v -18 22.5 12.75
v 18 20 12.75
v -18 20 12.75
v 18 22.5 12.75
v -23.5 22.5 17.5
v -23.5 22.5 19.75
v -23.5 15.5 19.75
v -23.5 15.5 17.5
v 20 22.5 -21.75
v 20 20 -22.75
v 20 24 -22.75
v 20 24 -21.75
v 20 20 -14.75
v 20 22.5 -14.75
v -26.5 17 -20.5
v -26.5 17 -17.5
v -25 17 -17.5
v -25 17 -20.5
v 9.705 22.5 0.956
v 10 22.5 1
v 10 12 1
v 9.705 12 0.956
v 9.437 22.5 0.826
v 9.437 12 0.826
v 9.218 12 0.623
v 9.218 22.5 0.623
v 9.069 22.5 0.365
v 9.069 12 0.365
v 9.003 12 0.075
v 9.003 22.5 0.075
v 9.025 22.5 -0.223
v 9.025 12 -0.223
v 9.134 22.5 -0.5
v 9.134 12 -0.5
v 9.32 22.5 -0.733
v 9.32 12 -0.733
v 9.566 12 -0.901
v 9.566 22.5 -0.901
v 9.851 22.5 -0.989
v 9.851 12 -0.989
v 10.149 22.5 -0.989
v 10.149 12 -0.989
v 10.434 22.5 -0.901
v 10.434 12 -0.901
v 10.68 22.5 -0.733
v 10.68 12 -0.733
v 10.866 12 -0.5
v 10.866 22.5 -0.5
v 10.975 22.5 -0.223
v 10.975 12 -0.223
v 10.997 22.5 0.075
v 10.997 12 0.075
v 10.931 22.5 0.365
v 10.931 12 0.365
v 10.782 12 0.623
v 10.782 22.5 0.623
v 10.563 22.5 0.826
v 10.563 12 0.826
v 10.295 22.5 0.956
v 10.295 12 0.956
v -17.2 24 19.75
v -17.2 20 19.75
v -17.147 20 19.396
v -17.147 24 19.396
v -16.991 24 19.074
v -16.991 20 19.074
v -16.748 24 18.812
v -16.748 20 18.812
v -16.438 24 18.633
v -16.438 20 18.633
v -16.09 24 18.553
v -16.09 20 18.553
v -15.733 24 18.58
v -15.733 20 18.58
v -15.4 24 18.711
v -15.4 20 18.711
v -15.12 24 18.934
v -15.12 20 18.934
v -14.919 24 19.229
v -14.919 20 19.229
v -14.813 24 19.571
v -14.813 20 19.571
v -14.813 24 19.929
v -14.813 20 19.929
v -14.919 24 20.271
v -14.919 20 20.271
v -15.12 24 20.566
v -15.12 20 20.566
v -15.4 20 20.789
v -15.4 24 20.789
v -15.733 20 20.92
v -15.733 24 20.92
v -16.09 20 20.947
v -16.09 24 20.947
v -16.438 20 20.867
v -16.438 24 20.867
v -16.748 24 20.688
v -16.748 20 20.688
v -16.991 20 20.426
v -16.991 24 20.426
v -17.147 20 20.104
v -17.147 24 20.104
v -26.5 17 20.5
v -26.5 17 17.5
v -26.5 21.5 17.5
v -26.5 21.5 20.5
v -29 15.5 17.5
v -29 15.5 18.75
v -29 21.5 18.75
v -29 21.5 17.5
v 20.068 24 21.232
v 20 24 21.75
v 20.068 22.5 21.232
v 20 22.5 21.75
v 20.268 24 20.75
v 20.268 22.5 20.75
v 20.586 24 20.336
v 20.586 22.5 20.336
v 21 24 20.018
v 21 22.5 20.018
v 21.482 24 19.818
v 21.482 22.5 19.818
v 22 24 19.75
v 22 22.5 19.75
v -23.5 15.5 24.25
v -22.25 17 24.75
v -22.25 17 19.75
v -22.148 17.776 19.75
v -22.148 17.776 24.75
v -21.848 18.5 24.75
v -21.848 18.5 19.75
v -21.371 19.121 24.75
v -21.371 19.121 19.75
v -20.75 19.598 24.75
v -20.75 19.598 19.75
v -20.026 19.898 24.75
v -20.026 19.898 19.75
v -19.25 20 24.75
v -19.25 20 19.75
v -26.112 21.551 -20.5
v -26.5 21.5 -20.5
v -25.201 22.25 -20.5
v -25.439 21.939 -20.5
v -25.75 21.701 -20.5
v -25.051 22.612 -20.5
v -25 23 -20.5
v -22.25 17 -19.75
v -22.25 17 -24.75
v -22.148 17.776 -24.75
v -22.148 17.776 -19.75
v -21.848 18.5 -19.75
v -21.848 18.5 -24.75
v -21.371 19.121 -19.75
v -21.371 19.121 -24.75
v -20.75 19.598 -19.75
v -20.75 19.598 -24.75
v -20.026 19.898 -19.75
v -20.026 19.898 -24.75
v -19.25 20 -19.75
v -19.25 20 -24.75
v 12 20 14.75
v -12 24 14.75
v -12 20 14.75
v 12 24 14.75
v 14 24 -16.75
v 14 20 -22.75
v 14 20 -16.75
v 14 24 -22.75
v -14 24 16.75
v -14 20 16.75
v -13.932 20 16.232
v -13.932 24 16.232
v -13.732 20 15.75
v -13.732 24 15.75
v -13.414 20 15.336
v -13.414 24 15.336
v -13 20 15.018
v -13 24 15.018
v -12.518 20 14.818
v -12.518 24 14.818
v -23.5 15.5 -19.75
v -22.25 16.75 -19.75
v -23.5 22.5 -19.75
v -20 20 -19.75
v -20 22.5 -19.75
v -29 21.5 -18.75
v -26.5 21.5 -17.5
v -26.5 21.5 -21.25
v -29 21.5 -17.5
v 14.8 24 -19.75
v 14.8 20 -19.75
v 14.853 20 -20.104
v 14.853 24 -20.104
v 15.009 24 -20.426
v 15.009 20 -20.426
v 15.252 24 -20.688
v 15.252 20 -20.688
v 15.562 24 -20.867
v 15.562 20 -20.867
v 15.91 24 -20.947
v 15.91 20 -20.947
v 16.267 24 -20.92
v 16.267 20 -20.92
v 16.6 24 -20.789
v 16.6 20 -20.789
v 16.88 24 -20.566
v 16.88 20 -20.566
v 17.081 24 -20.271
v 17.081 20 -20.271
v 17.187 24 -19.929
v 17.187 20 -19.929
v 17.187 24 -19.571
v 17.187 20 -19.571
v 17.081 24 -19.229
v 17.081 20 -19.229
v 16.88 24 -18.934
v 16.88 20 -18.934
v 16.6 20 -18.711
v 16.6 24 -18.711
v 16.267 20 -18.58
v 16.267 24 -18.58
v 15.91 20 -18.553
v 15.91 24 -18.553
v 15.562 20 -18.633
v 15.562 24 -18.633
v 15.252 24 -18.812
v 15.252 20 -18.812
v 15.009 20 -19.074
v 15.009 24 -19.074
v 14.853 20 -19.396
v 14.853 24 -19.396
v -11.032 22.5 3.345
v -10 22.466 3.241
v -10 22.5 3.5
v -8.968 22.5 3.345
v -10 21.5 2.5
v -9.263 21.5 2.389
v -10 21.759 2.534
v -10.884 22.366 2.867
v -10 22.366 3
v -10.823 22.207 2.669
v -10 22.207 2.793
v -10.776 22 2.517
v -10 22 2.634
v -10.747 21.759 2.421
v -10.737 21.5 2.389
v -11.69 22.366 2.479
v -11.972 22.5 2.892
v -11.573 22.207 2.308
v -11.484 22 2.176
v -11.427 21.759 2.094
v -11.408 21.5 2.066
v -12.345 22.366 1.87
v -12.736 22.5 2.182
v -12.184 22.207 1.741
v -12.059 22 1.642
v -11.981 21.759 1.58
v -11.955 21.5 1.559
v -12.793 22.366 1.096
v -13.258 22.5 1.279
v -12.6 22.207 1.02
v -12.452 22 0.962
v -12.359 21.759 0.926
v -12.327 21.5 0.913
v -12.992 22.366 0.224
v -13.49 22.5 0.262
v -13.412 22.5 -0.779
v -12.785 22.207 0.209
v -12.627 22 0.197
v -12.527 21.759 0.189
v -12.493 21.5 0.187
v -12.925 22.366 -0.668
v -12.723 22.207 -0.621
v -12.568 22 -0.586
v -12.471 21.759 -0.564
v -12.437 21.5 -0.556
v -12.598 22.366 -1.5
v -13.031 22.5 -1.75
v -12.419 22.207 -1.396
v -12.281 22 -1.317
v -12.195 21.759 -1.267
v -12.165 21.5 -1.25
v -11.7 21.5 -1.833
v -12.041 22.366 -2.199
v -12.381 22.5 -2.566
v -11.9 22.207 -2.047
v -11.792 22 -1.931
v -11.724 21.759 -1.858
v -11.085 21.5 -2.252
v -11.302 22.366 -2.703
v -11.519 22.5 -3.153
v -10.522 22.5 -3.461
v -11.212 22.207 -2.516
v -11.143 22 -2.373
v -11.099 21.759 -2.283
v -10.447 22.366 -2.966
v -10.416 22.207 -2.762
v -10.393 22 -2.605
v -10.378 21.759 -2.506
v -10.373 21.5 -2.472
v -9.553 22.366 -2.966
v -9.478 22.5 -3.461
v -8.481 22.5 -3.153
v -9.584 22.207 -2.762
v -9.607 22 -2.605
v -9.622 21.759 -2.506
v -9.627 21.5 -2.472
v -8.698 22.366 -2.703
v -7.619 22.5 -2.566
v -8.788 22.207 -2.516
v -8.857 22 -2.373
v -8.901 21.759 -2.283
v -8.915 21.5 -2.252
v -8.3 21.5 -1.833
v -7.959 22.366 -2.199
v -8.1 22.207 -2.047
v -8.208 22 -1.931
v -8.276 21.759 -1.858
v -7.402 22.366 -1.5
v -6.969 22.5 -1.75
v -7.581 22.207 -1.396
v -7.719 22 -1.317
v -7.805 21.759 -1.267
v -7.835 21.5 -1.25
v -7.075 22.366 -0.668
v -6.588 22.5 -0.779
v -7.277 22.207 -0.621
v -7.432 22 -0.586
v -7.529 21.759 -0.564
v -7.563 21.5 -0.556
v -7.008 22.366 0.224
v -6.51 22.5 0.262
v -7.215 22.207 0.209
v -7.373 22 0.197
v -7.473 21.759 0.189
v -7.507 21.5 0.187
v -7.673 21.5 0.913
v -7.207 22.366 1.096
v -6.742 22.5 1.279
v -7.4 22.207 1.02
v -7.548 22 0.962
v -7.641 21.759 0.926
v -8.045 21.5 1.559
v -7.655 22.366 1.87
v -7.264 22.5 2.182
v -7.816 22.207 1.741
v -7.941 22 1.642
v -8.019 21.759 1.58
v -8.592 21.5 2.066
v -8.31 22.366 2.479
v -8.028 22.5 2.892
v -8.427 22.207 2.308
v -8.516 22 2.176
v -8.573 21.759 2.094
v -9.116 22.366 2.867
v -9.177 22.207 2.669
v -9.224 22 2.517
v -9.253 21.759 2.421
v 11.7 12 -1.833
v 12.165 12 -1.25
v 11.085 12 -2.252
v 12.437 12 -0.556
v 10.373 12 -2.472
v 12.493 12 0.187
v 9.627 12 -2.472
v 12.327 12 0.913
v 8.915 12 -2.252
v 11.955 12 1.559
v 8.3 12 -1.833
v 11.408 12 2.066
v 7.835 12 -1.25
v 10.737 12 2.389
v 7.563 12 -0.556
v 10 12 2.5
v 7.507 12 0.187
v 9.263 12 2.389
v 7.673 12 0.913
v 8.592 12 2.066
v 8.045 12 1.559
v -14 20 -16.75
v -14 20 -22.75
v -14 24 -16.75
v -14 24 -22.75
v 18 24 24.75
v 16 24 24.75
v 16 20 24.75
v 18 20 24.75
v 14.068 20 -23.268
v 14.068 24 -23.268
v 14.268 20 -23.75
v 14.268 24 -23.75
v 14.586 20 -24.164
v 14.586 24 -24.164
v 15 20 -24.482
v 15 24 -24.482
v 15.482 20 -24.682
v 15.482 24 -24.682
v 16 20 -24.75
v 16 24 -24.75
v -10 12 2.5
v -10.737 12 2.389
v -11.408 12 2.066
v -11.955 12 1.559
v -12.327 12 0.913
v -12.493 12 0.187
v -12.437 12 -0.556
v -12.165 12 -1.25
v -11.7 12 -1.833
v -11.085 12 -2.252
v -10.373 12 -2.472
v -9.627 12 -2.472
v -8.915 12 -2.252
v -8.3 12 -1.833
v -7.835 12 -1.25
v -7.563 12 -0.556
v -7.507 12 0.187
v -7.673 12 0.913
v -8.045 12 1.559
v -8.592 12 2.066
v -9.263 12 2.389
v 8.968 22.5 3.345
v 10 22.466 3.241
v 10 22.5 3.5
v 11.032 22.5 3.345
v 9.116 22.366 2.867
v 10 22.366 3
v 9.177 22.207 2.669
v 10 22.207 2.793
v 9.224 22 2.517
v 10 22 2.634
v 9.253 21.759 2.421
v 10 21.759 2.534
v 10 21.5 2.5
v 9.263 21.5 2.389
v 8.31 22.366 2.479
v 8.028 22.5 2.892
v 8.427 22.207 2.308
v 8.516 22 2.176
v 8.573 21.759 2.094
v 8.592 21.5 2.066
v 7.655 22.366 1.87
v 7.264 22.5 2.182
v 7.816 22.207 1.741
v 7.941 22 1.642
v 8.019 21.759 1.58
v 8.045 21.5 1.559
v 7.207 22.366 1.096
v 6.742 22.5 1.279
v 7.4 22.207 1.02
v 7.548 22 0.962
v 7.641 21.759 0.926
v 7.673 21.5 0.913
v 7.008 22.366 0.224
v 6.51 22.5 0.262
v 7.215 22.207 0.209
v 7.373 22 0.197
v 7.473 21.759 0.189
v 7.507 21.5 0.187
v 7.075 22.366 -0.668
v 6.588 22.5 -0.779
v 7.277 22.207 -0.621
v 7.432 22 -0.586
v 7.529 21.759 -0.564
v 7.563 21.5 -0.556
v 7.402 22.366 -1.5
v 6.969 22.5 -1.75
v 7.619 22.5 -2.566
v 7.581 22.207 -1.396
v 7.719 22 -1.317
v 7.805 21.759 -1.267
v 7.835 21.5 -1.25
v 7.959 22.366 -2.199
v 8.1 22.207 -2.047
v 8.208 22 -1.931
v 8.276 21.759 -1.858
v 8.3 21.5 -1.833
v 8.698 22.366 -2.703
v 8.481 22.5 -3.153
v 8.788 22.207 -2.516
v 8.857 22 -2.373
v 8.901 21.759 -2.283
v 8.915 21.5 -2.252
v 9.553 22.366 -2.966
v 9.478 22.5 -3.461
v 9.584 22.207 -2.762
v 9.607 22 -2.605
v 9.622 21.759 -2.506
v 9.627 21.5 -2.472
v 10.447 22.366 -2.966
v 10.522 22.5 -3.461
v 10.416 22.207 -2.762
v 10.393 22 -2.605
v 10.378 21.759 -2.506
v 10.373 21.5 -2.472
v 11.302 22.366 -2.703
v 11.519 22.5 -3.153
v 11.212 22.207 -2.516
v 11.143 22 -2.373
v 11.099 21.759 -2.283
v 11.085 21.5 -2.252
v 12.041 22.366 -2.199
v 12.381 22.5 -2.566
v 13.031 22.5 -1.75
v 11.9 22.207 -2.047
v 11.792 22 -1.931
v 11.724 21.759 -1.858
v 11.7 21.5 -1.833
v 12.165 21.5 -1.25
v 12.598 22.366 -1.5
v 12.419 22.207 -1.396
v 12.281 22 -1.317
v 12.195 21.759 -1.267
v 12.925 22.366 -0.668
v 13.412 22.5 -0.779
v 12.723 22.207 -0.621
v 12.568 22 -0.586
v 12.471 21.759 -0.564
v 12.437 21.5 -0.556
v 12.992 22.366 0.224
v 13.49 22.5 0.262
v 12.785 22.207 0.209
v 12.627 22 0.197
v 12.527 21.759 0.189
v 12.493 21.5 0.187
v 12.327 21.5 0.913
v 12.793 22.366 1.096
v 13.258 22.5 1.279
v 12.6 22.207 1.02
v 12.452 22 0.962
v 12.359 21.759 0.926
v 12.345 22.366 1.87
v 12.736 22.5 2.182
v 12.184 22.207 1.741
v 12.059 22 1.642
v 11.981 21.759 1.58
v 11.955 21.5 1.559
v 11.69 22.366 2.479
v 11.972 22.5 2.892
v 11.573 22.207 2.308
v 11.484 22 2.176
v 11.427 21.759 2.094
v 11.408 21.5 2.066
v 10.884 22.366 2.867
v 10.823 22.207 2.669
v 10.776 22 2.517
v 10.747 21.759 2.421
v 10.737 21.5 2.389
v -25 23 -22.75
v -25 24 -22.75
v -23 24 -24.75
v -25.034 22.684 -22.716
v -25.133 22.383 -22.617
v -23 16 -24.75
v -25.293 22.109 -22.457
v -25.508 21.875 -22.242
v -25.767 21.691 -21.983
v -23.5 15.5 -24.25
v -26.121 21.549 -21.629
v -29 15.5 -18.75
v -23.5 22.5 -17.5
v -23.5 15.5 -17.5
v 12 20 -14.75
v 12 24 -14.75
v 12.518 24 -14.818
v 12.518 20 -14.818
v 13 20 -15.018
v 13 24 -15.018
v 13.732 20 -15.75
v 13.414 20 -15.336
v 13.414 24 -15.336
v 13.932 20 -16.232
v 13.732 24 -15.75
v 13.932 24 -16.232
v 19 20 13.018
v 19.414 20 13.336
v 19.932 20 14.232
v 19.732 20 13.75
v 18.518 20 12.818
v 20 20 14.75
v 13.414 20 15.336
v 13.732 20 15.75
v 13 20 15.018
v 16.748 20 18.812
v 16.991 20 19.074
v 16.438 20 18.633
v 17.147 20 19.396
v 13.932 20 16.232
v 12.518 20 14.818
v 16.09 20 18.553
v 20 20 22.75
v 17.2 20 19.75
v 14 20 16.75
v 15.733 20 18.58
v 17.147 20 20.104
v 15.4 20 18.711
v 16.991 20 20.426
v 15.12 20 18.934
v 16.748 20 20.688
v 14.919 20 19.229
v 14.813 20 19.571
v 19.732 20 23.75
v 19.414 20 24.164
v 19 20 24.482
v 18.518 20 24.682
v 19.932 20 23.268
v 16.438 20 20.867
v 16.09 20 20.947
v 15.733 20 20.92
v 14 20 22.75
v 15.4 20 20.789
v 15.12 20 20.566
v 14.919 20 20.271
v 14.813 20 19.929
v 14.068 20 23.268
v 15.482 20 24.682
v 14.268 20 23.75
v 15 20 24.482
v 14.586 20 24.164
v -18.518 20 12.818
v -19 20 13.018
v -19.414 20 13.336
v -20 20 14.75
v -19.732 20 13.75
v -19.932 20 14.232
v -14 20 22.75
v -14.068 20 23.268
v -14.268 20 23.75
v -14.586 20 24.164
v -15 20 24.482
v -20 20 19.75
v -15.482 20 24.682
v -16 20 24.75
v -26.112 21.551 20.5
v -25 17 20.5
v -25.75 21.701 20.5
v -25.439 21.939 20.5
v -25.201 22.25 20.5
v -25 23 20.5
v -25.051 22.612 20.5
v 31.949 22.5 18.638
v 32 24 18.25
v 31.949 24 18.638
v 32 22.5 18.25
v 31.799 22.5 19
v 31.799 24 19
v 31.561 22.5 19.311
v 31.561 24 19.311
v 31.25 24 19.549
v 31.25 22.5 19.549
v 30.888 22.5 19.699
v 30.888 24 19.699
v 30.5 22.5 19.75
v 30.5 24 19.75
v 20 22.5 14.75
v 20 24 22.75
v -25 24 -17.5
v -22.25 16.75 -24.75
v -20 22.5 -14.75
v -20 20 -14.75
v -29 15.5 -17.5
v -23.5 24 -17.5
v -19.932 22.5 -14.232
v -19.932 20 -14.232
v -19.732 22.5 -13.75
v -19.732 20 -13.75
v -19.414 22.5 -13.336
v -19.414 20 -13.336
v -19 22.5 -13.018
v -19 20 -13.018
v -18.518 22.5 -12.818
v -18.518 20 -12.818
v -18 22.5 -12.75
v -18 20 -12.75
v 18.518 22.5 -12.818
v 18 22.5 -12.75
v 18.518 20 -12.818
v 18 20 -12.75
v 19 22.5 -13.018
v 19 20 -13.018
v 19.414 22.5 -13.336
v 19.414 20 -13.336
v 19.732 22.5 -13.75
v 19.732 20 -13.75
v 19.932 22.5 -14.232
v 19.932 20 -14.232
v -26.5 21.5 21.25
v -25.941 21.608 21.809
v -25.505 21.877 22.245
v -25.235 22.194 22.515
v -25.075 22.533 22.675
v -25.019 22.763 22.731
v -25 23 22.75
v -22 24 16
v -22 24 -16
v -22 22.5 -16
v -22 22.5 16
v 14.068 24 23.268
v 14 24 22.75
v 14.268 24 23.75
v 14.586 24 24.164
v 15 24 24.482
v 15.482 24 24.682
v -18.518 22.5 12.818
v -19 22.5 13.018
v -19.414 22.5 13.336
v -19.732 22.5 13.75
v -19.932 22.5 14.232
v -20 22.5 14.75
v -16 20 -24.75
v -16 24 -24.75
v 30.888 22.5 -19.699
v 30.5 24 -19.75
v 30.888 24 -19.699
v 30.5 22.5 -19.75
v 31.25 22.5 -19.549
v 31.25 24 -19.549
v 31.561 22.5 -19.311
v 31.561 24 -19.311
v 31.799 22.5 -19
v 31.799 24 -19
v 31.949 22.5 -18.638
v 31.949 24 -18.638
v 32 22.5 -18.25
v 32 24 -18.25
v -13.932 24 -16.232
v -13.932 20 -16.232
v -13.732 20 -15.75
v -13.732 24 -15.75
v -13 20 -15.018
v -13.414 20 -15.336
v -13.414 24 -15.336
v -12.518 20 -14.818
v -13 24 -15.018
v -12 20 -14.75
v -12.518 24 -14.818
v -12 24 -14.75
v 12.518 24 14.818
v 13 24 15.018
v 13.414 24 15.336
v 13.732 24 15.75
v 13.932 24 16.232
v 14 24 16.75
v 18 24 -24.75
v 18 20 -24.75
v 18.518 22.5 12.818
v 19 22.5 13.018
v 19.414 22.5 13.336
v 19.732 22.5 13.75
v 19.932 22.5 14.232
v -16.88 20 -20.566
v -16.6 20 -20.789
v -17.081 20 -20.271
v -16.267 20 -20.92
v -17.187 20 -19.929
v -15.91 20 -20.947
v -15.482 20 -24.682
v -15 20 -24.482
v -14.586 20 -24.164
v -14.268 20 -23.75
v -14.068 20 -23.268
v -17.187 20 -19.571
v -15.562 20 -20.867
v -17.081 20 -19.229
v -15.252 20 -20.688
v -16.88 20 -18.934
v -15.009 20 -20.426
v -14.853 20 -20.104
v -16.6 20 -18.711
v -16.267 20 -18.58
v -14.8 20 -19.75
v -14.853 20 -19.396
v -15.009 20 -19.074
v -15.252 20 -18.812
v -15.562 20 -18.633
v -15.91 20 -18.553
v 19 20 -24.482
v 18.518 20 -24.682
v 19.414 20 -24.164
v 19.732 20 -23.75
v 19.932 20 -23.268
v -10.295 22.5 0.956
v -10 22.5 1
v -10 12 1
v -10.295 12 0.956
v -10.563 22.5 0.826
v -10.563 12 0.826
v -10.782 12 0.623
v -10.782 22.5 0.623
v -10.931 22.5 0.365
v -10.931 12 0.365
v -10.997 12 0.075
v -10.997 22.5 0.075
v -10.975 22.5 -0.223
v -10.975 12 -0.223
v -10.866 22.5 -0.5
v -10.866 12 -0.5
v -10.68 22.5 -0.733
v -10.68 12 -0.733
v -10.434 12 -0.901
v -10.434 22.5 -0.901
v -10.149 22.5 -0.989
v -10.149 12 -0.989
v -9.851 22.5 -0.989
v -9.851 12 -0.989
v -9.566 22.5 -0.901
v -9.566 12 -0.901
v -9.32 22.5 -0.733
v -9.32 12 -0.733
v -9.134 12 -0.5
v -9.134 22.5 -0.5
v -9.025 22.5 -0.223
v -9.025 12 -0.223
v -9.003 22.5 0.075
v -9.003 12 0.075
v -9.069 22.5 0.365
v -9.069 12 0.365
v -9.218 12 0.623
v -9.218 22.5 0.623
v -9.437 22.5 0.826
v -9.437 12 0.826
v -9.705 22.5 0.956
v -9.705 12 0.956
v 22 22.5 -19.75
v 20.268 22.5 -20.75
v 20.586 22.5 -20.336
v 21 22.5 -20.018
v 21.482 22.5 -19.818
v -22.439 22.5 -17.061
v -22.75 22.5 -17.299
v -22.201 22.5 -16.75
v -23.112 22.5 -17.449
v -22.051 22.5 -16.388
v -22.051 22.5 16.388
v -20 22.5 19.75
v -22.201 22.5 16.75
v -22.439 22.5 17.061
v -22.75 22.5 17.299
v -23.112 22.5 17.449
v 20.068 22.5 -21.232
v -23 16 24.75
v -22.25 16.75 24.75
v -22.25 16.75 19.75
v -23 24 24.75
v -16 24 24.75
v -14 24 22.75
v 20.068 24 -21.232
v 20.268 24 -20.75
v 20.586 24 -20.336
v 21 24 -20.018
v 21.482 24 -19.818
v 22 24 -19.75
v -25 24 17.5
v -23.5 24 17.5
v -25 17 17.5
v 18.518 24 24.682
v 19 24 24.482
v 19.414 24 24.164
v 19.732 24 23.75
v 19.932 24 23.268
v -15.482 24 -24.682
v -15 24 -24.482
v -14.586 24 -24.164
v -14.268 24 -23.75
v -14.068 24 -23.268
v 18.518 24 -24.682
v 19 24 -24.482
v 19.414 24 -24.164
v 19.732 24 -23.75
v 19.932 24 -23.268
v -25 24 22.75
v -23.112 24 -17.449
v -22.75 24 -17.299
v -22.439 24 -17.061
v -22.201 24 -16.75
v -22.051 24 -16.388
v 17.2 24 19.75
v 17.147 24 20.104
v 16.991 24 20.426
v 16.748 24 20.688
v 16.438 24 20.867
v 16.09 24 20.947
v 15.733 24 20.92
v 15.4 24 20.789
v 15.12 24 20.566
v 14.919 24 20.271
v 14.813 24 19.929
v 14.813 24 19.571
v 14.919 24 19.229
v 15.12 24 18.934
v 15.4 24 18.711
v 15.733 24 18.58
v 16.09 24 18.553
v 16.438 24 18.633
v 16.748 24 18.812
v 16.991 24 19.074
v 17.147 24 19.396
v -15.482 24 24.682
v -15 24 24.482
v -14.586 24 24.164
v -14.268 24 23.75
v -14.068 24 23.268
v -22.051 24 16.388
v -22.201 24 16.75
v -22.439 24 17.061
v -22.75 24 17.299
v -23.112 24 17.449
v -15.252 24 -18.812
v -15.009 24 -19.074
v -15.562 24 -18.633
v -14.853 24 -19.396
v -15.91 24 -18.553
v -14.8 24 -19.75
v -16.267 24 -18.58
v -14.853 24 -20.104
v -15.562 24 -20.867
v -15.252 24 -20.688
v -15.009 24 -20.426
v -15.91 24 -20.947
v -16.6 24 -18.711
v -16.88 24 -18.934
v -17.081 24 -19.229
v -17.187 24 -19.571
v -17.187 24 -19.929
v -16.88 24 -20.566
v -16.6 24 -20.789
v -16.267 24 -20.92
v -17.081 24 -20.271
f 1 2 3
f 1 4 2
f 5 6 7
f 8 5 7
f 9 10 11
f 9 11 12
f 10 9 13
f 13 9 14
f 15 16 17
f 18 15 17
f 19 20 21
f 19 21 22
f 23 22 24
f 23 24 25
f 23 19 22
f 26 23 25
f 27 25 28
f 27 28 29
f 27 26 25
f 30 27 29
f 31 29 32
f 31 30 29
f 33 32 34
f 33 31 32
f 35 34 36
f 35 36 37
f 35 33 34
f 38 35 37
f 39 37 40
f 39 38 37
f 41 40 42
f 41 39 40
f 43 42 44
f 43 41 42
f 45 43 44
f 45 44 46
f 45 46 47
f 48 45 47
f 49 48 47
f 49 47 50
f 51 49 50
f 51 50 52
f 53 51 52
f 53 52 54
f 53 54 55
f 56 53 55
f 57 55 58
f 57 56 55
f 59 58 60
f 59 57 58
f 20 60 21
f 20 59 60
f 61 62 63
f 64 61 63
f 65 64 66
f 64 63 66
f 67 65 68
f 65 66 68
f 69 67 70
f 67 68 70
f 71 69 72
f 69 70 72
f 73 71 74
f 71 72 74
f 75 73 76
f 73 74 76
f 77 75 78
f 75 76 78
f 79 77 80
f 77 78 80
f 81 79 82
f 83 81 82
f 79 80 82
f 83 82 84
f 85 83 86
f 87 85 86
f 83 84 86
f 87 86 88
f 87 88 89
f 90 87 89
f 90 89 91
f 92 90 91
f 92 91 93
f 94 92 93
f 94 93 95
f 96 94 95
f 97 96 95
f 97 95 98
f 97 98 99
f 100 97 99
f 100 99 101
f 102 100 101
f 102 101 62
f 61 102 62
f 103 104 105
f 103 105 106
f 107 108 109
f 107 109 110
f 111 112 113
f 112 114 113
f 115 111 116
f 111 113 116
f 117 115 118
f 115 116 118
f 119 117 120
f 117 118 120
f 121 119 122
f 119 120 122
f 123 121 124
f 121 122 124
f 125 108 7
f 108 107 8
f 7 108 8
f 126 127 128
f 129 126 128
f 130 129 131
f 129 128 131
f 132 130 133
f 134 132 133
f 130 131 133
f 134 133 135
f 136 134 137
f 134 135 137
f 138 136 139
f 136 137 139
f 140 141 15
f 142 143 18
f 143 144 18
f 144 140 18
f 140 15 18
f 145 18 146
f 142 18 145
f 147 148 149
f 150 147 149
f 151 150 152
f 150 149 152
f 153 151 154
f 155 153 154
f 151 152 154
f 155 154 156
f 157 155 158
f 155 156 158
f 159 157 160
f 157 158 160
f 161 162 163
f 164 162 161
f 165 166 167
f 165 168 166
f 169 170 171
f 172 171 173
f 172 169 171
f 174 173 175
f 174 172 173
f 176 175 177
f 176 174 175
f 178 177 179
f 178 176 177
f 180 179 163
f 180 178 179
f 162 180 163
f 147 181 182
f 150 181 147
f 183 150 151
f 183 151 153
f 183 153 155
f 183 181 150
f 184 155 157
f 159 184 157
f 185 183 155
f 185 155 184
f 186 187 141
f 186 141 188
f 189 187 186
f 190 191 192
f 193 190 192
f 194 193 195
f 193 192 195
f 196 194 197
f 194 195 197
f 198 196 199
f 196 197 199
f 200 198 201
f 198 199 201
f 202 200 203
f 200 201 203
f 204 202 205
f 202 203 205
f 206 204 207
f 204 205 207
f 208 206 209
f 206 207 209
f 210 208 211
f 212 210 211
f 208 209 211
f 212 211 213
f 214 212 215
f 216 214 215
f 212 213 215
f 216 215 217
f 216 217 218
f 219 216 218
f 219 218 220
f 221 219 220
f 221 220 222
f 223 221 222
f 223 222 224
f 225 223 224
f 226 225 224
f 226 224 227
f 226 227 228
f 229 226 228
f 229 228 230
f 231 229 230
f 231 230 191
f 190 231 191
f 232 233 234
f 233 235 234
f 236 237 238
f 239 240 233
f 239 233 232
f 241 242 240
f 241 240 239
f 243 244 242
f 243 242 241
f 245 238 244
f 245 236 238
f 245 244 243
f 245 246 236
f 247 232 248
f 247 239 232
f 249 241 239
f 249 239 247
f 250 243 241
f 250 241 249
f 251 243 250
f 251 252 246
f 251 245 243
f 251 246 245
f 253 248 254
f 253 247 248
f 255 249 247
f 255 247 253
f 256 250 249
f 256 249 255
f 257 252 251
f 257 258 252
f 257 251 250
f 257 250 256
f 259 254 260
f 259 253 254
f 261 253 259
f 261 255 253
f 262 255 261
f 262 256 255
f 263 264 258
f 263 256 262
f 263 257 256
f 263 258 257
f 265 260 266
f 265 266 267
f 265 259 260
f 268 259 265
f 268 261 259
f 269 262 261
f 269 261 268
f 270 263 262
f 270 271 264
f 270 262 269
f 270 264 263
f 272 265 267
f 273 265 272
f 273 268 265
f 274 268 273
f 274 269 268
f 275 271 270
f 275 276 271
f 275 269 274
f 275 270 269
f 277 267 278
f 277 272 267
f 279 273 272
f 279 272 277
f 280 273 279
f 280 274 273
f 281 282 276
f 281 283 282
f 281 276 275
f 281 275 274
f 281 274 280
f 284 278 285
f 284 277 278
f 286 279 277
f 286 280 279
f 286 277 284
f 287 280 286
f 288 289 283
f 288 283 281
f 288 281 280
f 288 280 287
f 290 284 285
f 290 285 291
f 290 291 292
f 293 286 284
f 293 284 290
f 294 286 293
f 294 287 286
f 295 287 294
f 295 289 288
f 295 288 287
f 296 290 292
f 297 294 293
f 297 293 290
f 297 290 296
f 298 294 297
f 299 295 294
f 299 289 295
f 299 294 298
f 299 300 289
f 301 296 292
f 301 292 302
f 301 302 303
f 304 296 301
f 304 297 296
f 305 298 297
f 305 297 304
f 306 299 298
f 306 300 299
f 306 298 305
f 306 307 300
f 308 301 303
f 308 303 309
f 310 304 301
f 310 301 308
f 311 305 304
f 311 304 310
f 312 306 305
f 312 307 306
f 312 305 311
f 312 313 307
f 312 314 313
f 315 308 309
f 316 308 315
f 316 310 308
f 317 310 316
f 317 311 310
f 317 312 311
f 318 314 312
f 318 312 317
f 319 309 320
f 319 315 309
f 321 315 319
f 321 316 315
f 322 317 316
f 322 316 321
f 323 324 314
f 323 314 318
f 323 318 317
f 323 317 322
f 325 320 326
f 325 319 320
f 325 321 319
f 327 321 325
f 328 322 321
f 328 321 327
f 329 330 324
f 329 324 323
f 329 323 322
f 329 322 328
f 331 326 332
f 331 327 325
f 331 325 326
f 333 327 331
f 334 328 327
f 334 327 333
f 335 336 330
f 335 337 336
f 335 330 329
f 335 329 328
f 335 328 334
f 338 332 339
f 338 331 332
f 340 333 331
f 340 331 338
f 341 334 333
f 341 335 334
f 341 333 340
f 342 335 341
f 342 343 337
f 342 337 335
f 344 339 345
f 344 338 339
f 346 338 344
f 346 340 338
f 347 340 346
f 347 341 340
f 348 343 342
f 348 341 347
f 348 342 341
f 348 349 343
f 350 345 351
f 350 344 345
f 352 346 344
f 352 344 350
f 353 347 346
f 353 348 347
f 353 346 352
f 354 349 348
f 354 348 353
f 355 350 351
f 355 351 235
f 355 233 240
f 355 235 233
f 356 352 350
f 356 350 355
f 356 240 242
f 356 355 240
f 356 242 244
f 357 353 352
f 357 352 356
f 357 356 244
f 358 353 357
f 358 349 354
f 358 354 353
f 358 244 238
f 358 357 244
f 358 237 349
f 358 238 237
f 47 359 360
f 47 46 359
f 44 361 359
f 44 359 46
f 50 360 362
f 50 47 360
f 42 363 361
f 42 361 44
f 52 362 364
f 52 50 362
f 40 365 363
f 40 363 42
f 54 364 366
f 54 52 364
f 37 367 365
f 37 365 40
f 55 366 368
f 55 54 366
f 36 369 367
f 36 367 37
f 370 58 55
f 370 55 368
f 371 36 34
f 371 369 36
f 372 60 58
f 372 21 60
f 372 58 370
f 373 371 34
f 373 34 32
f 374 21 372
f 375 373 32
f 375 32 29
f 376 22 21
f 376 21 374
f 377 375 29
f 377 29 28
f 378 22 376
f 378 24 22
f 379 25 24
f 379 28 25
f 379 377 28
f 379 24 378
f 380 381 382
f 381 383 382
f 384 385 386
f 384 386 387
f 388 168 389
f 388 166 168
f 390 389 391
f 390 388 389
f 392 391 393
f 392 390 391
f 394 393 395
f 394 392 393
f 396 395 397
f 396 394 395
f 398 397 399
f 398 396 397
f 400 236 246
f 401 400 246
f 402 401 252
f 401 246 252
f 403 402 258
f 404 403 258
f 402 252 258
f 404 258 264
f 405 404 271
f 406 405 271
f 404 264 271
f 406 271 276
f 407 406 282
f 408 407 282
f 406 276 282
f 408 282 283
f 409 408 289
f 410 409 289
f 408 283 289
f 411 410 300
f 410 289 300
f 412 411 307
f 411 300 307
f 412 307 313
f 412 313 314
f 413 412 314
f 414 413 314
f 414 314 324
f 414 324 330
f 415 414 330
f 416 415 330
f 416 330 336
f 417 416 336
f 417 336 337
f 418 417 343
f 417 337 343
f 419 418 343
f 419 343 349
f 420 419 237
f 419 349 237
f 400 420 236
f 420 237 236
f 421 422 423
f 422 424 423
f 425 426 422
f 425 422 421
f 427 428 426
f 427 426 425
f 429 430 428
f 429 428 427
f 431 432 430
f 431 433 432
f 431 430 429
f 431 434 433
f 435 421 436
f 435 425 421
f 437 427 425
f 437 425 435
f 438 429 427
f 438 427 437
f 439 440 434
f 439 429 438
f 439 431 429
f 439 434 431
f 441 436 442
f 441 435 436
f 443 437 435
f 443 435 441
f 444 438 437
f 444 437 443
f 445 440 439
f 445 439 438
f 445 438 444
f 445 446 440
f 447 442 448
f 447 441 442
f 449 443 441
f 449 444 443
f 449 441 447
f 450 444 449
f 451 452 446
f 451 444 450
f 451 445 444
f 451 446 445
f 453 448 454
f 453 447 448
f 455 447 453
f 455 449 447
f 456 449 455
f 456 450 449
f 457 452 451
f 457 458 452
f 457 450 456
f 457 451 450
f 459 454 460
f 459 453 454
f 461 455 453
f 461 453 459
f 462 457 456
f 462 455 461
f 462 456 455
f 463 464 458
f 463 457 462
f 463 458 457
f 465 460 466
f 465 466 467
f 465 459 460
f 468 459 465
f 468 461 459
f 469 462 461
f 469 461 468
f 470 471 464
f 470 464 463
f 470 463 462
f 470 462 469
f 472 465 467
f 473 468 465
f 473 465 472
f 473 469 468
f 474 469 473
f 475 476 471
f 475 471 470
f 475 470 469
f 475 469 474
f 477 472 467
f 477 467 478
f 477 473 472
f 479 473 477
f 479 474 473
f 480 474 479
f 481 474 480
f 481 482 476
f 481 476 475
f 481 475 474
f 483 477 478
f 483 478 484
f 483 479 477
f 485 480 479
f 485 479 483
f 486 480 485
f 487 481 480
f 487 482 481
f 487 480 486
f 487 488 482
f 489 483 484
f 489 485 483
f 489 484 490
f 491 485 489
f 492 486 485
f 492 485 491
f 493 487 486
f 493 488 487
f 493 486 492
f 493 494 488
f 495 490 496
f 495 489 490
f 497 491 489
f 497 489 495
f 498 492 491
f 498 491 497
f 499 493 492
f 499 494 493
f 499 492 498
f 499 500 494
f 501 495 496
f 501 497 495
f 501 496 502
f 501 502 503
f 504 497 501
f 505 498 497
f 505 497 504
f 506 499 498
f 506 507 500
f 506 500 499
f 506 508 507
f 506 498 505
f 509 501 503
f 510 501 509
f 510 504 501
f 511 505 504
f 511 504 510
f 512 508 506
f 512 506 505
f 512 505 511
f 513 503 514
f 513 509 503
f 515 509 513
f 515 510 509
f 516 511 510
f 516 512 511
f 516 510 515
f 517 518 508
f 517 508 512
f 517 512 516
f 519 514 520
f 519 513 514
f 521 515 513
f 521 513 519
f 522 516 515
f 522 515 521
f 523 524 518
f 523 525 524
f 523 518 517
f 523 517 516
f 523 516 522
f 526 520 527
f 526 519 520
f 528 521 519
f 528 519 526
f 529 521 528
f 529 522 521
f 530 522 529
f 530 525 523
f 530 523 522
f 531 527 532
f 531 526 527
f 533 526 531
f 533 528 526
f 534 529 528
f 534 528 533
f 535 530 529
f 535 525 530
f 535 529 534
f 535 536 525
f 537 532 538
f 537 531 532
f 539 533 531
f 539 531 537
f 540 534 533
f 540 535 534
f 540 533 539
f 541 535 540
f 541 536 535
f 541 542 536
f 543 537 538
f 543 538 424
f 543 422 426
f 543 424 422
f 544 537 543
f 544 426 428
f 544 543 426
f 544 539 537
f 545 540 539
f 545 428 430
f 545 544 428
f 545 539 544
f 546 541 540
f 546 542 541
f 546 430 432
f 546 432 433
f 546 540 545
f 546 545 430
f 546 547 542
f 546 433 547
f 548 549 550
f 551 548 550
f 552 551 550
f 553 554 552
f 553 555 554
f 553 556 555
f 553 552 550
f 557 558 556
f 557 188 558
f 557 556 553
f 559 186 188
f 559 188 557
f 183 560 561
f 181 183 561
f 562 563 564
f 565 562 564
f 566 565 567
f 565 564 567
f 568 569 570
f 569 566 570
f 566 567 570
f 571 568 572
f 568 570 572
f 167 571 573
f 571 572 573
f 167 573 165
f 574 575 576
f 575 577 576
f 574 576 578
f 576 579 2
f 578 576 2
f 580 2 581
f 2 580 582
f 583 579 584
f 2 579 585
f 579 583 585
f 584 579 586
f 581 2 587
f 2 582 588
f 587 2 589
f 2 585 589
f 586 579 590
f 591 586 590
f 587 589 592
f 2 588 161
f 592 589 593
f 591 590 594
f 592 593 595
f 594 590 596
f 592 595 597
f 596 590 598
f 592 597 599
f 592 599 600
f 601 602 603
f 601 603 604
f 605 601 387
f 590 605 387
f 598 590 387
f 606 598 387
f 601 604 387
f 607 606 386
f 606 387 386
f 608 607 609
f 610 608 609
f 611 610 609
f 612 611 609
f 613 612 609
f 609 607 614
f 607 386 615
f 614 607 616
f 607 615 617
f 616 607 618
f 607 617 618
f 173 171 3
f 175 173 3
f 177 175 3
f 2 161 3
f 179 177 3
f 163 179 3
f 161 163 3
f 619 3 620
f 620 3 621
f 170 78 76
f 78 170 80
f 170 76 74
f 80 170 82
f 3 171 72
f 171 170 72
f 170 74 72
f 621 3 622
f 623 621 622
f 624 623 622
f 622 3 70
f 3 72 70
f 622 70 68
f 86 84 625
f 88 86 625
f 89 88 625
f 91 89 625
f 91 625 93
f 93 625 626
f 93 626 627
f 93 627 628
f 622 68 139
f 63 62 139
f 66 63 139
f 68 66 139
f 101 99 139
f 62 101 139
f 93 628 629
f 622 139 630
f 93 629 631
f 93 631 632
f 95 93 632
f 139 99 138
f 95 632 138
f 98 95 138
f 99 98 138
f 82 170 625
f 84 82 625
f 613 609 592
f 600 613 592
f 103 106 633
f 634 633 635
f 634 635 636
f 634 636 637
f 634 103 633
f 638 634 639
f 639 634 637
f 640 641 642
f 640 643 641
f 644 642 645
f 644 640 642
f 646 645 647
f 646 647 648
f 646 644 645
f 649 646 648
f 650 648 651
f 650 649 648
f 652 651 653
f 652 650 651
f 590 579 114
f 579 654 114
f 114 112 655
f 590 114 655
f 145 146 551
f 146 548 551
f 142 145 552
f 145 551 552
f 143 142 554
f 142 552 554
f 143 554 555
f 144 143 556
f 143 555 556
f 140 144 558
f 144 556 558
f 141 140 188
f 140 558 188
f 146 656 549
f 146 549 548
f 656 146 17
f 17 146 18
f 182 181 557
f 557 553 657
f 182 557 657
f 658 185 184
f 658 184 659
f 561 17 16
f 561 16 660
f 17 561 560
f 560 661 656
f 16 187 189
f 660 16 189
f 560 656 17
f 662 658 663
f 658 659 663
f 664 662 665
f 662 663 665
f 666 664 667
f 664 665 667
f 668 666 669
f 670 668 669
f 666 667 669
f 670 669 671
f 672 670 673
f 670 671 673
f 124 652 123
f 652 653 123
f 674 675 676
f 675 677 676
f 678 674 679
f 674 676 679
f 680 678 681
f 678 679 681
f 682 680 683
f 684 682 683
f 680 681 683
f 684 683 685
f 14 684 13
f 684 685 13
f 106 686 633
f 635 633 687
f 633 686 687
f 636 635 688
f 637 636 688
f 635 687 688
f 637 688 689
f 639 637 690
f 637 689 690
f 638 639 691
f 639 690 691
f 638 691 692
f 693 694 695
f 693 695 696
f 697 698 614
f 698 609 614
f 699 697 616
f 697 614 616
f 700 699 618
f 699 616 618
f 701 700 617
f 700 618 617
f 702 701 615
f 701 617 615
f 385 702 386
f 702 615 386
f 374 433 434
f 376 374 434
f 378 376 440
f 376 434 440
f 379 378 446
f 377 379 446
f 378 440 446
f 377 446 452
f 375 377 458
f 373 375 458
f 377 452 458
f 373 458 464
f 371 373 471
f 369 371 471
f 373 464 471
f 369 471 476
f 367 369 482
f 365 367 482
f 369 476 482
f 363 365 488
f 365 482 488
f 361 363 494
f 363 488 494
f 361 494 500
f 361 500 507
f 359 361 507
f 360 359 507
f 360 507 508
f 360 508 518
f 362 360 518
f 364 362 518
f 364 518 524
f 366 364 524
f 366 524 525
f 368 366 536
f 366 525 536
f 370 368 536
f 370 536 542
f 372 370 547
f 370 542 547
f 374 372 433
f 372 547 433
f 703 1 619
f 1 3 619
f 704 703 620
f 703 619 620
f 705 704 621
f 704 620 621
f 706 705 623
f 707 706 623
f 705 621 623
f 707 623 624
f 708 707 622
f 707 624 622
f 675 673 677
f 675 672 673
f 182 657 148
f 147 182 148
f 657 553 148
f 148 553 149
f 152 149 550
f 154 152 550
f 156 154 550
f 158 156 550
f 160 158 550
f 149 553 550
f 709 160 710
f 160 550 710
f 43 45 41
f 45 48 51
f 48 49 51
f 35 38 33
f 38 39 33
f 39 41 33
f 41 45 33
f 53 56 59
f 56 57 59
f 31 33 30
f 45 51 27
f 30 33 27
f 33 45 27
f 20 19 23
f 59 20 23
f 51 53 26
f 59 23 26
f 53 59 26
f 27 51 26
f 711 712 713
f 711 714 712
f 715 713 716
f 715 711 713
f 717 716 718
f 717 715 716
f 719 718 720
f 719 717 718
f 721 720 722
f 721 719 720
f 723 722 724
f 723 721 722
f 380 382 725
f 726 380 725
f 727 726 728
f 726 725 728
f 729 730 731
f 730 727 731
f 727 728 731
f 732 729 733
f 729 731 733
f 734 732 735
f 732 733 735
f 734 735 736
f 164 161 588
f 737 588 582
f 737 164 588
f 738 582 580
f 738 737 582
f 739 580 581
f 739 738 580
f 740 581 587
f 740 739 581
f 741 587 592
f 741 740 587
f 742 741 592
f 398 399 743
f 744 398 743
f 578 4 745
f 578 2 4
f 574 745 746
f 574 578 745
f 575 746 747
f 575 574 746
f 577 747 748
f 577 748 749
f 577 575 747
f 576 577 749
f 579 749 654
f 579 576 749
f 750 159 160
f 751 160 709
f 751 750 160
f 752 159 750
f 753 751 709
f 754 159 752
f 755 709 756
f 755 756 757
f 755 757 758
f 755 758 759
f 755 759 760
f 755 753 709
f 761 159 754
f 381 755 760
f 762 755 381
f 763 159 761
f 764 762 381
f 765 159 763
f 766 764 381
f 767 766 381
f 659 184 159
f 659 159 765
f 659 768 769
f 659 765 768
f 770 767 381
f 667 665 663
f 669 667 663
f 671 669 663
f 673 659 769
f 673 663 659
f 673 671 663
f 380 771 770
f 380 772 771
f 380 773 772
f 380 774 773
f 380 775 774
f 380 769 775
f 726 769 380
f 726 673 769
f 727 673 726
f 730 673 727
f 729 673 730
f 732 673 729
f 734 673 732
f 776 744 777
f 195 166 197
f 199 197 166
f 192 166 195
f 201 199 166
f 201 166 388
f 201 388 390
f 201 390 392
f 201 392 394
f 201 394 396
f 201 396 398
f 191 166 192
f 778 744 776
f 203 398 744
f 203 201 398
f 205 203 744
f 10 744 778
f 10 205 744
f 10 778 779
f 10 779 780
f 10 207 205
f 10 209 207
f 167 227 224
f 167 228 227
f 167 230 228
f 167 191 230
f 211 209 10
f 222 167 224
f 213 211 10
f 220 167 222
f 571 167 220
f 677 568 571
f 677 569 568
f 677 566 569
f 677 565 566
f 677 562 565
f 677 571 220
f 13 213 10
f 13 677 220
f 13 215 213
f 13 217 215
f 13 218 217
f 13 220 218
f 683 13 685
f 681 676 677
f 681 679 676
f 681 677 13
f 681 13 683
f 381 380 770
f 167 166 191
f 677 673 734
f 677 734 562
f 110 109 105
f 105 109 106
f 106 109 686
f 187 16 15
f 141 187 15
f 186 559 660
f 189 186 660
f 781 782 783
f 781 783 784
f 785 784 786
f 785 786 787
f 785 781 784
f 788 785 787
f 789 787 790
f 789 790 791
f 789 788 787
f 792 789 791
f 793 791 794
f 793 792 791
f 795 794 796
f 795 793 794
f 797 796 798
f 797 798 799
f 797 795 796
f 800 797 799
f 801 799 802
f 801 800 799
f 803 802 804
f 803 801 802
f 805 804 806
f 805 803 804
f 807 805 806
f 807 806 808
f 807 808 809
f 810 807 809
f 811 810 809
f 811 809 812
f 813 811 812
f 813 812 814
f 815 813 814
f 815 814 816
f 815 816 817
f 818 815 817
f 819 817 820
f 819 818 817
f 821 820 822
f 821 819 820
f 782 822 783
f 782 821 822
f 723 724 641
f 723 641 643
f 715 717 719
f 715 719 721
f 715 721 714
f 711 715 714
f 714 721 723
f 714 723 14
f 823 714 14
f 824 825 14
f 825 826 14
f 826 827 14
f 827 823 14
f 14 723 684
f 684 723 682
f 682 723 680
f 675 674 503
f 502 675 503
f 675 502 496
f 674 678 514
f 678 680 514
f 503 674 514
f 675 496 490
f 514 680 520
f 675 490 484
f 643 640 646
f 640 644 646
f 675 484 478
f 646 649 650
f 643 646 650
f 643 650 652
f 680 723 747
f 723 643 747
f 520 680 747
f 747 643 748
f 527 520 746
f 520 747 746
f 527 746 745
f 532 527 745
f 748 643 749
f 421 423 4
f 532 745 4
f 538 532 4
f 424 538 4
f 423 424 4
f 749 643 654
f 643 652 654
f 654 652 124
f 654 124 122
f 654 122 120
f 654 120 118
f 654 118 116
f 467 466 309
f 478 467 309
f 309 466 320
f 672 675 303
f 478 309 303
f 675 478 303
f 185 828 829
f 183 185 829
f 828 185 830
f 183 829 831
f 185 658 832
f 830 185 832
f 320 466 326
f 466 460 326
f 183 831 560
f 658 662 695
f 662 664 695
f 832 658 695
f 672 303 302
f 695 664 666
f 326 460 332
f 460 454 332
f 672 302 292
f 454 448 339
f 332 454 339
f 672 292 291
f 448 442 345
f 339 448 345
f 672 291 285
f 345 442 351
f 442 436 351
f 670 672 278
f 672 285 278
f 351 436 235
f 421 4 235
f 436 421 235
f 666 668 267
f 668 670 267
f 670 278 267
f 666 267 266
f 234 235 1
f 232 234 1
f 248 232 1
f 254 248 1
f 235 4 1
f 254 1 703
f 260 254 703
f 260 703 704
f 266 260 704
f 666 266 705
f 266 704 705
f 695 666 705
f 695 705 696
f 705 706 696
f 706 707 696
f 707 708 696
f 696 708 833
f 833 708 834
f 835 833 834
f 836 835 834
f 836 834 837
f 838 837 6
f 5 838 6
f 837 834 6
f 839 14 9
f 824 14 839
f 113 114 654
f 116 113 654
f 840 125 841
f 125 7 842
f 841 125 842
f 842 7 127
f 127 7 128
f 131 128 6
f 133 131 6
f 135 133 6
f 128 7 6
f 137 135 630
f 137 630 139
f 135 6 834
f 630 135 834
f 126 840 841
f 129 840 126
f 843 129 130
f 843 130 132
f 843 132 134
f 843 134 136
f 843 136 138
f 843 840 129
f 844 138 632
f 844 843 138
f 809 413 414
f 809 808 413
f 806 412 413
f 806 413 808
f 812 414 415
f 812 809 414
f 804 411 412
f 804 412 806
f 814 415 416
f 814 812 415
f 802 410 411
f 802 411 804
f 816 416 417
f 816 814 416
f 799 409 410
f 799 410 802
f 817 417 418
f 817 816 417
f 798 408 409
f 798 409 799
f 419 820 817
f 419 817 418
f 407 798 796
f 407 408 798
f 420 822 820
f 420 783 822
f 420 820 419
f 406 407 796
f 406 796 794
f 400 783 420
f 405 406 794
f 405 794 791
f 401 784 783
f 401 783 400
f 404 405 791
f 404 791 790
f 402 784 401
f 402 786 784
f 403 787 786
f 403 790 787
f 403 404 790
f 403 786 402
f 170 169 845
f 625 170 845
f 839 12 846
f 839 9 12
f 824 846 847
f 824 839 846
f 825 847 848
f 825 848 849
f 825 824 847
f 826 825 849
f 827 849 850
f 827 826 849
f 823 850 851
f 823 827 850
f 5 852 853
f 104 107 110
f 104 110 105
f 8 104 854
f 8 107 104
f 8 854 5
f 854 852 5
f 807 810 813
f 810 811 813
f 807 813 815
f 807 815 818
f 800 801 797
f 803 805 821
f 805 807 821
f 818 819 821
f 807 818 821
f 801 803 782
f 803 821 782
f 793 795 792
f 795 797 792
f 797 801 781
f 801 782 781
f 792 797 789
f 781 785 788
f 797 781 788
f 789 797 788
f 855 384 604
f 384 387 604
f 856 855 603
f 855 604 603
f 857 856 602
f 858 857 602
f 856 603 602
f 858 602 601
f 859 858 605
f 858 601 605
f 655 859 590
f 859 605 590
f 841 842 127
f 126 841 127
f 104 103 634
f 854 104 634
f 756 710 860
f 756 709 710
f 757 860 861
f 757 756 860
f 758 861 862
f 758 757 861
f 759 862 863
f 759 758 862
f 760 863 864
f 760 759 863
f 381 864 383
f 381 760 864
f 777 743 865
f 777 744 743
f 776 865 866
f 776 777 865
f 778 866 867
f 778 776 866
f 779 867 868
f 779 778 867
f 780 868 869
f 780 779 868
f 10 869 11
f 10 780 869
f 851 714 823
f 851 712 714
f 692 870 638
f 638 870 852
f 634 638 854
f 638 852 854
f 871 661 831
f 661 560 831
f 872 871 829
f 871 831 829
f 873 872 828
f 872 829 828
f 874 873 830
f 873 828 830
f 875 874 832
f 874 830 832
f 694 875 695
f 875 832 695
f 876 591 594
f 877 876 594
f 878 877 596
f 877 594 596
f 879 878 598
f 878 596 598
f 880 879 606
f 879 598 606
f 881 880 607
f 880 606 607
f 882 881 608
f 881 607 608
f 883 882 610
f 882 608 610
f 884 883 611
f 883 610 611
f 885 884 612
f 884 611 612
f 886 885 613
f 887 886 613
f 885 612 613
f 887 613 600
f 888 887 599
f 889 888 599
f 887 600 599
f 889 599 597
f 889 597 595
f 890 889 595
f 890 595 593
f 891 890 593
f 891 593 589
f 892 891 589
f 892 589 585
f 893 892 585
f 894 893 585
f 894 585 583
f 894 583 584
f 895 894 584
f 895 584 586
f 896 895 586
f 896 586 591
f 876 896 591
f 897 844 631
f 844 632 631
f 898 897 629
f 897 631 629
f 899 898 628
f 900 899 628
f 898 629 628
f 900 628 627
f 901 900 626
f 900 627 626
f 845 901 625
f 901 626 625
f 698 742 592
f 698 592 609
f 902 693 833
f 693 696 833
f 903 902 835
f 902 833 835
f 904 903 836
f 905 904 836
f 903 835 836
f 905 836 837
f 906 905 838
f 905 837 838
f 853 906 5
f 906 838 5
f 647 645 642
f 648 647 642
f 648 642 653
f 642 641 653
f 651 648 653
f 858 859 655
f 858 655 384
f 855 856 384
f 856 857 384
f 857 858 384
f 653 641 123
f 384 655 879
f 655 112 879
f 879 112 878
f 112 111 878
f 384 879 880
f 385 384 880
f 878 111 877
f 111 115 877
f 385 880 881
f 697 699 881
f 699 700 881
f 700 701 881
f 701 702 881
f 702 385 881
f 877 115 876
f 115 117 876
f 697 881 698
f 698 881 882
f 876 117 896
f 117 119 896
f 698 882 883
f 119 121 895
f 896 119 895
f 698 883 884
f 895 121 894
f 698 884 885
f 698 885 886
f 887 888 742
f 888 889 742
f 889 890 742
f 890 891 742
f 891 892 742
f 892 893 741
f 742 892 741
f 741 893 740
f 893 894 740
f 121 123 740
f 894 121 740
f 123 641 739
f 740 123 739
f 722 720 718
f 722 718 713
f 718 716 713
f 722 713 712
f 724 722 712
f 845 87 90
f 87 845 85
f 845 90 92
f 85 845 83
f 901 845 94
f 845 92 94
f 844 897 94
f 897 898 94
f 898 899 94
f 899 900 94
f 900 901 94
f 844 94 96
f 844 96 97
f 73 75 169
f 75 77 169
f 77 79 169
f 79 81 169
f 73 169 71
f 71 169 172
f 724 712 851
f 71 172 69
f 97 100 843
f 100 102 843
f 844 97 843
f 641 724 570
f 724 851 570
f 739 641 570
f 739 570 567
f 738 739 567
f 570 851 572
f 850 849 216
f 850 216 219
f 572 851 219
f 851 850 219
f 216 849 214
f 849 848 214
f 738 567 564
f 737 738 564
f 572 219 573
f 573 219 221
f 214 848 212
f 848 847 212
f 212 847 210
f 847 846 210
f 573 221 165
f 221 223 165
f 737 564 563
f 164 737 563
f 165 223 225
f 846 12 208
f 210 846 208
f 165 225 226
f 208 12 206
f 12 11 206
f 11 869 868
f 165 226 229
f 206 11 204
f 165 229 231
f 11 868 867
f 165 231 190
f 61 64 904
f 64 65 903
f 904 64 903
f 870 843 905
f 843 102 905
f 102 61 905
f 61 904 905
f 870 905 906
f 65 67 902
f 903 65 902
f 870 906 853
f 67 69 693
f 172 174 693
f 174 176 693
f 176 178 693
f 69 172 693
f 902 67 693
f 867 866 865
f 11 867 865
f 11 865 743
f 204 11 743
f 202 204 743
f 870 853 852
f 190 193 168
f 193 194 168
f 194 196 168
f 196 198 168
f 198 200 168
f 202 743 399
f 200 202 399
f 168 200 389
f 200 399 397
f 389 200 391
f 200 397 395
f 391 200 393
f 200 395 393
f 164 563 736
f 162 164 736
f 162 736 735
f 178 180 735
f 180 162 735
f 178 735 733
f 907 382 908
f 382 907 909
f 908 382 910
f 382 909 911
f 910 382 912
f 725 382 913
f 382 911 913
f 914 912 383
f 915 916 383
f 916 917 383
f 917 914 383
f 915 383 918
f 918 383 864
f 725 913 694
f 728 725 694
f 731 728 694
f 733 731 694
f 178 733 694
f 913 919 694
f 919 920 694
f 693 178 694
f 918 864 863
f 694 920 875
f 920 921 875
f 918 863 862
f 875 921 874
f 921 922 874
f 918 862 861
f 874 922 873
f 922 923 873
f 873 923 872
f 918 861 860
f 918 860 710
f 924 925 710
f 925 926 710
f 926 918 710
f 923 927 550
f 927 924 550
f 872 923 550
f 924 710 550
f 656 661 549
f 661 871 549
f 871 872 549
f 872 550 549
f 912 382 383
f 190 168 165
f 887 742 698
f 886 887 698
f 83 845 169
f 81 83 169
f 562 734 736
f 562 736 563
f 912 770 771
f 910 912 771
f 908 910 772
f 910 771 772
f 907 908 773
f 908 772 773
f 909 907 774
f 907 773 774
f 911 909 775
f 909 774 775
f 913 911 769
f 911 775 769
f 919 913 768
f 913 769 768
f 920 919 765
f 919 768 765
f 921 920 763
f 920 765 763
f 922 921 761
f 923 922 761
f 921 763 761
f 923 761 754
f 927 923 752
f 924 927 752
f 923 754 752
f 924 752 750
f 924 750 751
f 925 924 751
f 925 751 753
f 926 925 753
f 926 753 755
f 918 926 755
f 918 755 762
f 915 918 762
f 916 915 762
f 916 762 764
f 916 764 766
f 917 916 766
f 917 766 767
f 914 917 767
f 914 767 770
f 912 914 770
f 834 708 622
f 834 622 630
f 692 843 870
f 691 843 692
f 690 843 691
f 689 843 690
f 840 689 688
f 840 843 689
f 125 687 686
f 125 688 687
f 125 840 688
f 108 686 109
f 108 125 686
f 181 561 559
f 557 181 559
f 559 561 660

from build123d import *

# Parameters (mm, degrees)
BOSS_EXTRUDE1_DEPTH  = 19.75
SKETCH2_W            = 28
SKETCH2_H            = 5
CUT_EXTRUDE1_DEPTH   = 39.25
SKETCH3_W            = 6
SKETCH3_H            = 5
BOSS_EXTRUDE2_DEPTH  = 4
BOSS_EXTRUDE4_DEPTH  = 5
BOSS_EXTRUDE5_START  = -5
BOSS_EXTRUDE5_DEPTH  = 5
CHAMFER2_SIZE        = 2
FILLET1_R            = 2
CUT_EXTRUDE3_DEPTH   = 42.337785379
BOSS_EXTRUDE6_DEPTH  = 6
FILLET2_R            = 1.5
SKETCH11_R           = 2.5
SKETCH11_R_2         = 1
BOSS_EXTRUDE7_DEPTH  = 10.5
FILLET3_R            = 1
FILLET4_R            = 1.5
SKETCH13_W           = 6
SKETCH13_H           = 7
BOSS_EXTRUDE8_DEPTH  = 2.5
SKETCH14_R           = 1.2
CUT_EXTRUDE6_DEPTH   = 42.237877006
BOSS_EXTRUDE9_DEPTH  = 2.5
FILLET5_R            = 2
SKETCH18_W           = 1.5
SKETCH18_H           = 1.5
BOSS_EXTRUDE10_DEPTH = 0.75
SKETCH19_W           = 1.5
SKETCH19_H           = 1.5
BOSS_EXTRUDE11_DEPTH = 0.75


with BuildPart() as part:
    # Sketch1 → Boss-Extrude1 (new, symmetric)
    with BuildSketch(Plane.XY):
        Polygon((-25, 24), (32, 24), (32, 22.5), (-23.5, 22.5), (-23.5, 15.5), (-26.5, 15.5), (-26.5, 17), (-25, 17), align=None)
    extrude(amount=BOSS_EXTRUDE1_DEPTH, both=True)

    # Sketch2 → Cut-Extrude1 (cut, through all)
    with BuildSketch(Plane.XZ.offset(-22.5)):
        with Locations((0, 17.25)):
            Rectangle(SKETCH2_W, SKETCH2_H)
        with Locations((0, -17.25)):
            Rectangle(SKETCH2_W, SKETCH2_H)
    extrude(amount=-CUT_EXTRUDE1_DEPTH, mode=Mode.SUBTRACT)

    # Sketch3 → Boss-Extrude2 (add)
    with BuildSketch(Plane(origin=(0, 24, 0), x_dir=(1, 0, 0), z_dir=(0, 1, 0))):
        with Locations((-17, 22.25)):
            Rectangle(SKETCH3_W, SKETCH3_H)
        with Locations((17, 22.25)):
            Rectangle(SKETCH3_W, SKETCH3_H)
        with Locations((17, -22.25)):
            Rectangle(SKETCH3_W, SKETCH3_H)
        with Locations((-17, -22.25)):
            Rectangle(SKETCH3_W, SKETCH3_H)
    extrude(amount=-BOSS_EXTRUDE2_DEPTH)

    # Sketch6 → Boss-Extrude4 (add)
    with BuildSketch(Plane(origin=(0, 0, -24.75), x_dir=(-1, 0, 0), z_dir=(0, 0, -1))):
        with BuildLine():
            Line((20, 24), (25, 24))
            Line((25, 24), (25, 15.5))
            Line((25, 15.5), (23.5, 15.5))
            Line((23.5, 15.5), (22.25, 16.75))
            Line((22.25, 16.75), (22.25, 17))
            ThreePointArc((22.25, 17), (21.371320344, 19.121320344), (19.25, 20))
            Line((19.25, 20), (20, 20))
            Line((20, 20), (20, 24))
        make_face()
    extrude(amount=-BOSS_EXTRUDE4_DEPTH)

    # Sketch7 → Boss-Extrude5 (add)
    with BuildSketch(Plane.XY.offset(24.75).offset(BOSS_EXTRUDE5_START)):
        with BuildLine():
            Line((-20, 20), (-20, 24))
            Line((-20, 24), (-25, 24))
            Line((-25, 24), (-25, 15.5))
            Line((-25, 15.5), (-23.5, 15.5))
            Line((-23.5, 15.5), (-22.25, 16.75))
            Line((-22.25, 16.75), (-22.25, 17))
            ThreePointArc((-22.25, 17), (-21.371320344, 19.121320344), (-19.25, 20))
            Line((-19.25, 20), (-20, 20))
        make_face()
    extrude(amount=BOSS_EXTRUDE5_DEPTH)

    # Chamfer2
    chamfer2_edges = [part.edges().sort_by_distance(p)[0] for p in [
        (-25, 19.75, -24.75),
        (-25, 19.75, 24.75),
    ]]
    chamfer(chamfer2_edges, length=CHAMFER2_SIZE)

    # Fillet1
    fillet1_edges = [part.edges().sort_by_distance(p)[0] for p in [
        (14, 23.25, 14.75),
        (-14, 23.25, 14.75),
        (-14, 23.25, -14.75),
        (14, 23.25, -14.75),
        (14, 22, 24.75),
        (20, 23.25, 19.75),
        (20, 22, 24.75),
        (-14, 22, 24.75),
        (20, 23.25, -19.75),
        (14, 22, -24.75),
        (20, 22, -24.75),
        (-14, 22, -24.75),
    ]]
    fillet(fillet1_edges, radius=FILLET1_R)

    # Sketch8 → Cut-Extrude3 (cut, through all)
    with BuildSketch(Plane(origin=(0, 24, 0), x_dir=(1, 0, 0), z_dir=(0, 1, 0))):
        Polygon((-25, 17.5), (-22, 17.5), (-22, -17.5), (-25, -17.5), (-26.867861181, -17.5), (-26.867861181, 17.5), align=None)
    extrude(amount=-CUT_EXTRUDE3_DEPTH, mode=Mode.SUBTRACT)

    # Sketch9 → Boss-Extrude6 (add)
    with BuildSketch(Plane.XZ.offset(-15.5)):
        Polygon((-25, 22.75), (-29, 18.75), (-29, 17.5), (-26.5, 17.5), (-26.5, 20.5), (-25, 20.5), align=None)
        Polygon((-25, -20.5), (-25, -22.75), (-29, -18.75), (-29, -17.5), (-26.5, -17.5), (-26.5, -20.5), align=None)
    extrude(amount=-BOSS_EXTRUDE6_DEPTH)

    # Fillet2
    fillet2_edges = [part.edges().sort_by_distance(p)[0] for p in [
        (-25, 21.5, 21.625),
        (-25, 21.5, -21.625),
    ]]
    fillet(fillet2_edges, radius=FILLET2_R)

    # Sketch11 → Boss-Extrude7 (add)
    # profile 1 of 2: a face of its own
    with BuildSketch(Plane.XZ.offset(-22.5)):
        with Locations(Location((10, 0, 0), (0, 0, 90))):
            Circle(SKETCH11_R)
        with Locations(Location((10, 0, 0), (0, 0, 90))):
            Circle(SKETCH11_R_2, mode=Mode.SUBTRACT)
    # profile 2 of 2: a face of its own
    with BuildSketch(Plane.XZ.offset(-22.5)):
        with Locations(Location((-10, 0, 0), (0, 0, 90))):
            Circle(SKETCH11_R)
        with Locations(Location((-10, 0, 0), (0, 0, 90))):
            Circle(SKETCH11_R_2, mode=Mode.SUBTRACT)
    extrude(amount=BOSS_EXTRUDE7_DEPTH)

    # Fillet3
    fillet3_edges = [part.edges().sort_by_distance(p)[0] for p in [
        (10, 22.5, -2.5),
        (-10, 22.5, -2.5),
    ]]
    fillet(fillet3_edges, radius=FILLET3_R)

    # Fillet4
    fillet4_edges = [part.edges().sort_by_distance(p)[0] for p in [
        (32, 23.25, -19.75),
        (32, 23.25, 19.75),
        (-22, 23.25, -17.5),
        (-22, 23.25, 17.5),
    ]]
    fillet(fillet4_edges, radius=FILLET4_R)

    # Sketch13 → Boss-Extrude8 (add)
    with BuildSketch(Plane.XZ.offset(-22.5)):
        with Locations((17, 16.25)):
            Rectangle(SKETCH13_W, SKETCH13_H)
        with Locations((17, -16.25)):
            Rectangle(SKETCH13_W, SKETCH13_H)
        with Locations((-17, -16.25)):
            Rectangle(SKETCH13_W, SKETCH13_H)
        with Locations((-17, 16.25)):
            Rectangle(SKETCH13_W, SKETCH13_H)
    extrude(amount=BOSS_EXTRUDE8_DEPTH)

    # Sketch14 → Cut-Extrude6 (cut, through all)
    with BuildSketch(Plane.XZ.offset(-20)):
        with Locations((16, 19.75)):
            Circle(SKETCH14_R)
        with Locations(Location((-16, 19.75, 0), (0, 0, 180))):
            Circle(SKETCH14_R)
        with Locations((-16, -19.75)):
            Circle(SKETCH14_R)
        with Locations(Location((16, -19.75, 0), (0, 0, 180))):
            Circle(SKETCH14_R)
    extrude(amount=-CUT_EXTRUDE6_DEPTH, mode=Mode.SUBTRACT)

    # Sketch15 → Boss-Extrude9 (add)
    with BuildSketch(Plane.XZ.offset(-22.5)):
        with BuildLine():
            Line((14, 16.75), (14, 12.75))
            Line((14, 12.75), (-14, 12.75))
            Line((-14, 12.75), (-14, 16.75))
            ThreePointArc((-14, 16.75), (-13.414213562, 15.335786438), (-12, 14.75))
            Line((-12, 14.75), (12, 14.75))
            ThreePointArc((12, 14.75), (13.414213562, 15.335786438), (14, 16.75))
        make_face()
        with BuildLine():
            Line((-14, -12.75), (14, -12.75))
            Line((14, -12.75), (14, -16.75))
            ThreePointArc((14, -16.75), (13.414213562, -15.335786438), (12, -14.75))
            Line((12, -14.75), (-12, -14.75))
            ThreePointArc((-12, -14.75), (-13.414213562, -15.335786438), (-14, -16.75))
            Line((-14, -16.75), (-14, -12.75))
        make_face()
    extrude(amount=BOSS_EXTRUDE9_DEPTH)

    # Fillet5
    fillet5_edges = [part.edges().sort_by_distance(p)[0] for p in [
        (20, 21.25, 12.75),
        (20, 21.25, -12.75),
        (-20, 21.25, -12.75),
        (-20, 21.25, 12.75),
    ]]
    fillet(fillet5_edges, radius=FILLET5_R)

    # Sketch18 → Boss-Extrude10 (add)
    with BuildSketch(Plane.XY.offset(19.75)):
        with Locations((-25.75, 16.25)):
            Rectangle(SKETCH18_W, SKETCH18_H)
    extrude(amount=BOSS_EXTRUDE10_DEPTH)

    # Sketch19 → Boss-Extrude11 (add)
    with BuildSketch(Plane(origin=(0, 0, -19.75), x_dir=(-1, 0, 0), z_dir=(0, 0, -1))):
        with Locations((25.75, 16.25)):
            Rectangle(SKETCH19_W, SKETCH19_H)
    extrude(amount=BOSS_EXTRUDE11_DEPTH)


solid = part.part
